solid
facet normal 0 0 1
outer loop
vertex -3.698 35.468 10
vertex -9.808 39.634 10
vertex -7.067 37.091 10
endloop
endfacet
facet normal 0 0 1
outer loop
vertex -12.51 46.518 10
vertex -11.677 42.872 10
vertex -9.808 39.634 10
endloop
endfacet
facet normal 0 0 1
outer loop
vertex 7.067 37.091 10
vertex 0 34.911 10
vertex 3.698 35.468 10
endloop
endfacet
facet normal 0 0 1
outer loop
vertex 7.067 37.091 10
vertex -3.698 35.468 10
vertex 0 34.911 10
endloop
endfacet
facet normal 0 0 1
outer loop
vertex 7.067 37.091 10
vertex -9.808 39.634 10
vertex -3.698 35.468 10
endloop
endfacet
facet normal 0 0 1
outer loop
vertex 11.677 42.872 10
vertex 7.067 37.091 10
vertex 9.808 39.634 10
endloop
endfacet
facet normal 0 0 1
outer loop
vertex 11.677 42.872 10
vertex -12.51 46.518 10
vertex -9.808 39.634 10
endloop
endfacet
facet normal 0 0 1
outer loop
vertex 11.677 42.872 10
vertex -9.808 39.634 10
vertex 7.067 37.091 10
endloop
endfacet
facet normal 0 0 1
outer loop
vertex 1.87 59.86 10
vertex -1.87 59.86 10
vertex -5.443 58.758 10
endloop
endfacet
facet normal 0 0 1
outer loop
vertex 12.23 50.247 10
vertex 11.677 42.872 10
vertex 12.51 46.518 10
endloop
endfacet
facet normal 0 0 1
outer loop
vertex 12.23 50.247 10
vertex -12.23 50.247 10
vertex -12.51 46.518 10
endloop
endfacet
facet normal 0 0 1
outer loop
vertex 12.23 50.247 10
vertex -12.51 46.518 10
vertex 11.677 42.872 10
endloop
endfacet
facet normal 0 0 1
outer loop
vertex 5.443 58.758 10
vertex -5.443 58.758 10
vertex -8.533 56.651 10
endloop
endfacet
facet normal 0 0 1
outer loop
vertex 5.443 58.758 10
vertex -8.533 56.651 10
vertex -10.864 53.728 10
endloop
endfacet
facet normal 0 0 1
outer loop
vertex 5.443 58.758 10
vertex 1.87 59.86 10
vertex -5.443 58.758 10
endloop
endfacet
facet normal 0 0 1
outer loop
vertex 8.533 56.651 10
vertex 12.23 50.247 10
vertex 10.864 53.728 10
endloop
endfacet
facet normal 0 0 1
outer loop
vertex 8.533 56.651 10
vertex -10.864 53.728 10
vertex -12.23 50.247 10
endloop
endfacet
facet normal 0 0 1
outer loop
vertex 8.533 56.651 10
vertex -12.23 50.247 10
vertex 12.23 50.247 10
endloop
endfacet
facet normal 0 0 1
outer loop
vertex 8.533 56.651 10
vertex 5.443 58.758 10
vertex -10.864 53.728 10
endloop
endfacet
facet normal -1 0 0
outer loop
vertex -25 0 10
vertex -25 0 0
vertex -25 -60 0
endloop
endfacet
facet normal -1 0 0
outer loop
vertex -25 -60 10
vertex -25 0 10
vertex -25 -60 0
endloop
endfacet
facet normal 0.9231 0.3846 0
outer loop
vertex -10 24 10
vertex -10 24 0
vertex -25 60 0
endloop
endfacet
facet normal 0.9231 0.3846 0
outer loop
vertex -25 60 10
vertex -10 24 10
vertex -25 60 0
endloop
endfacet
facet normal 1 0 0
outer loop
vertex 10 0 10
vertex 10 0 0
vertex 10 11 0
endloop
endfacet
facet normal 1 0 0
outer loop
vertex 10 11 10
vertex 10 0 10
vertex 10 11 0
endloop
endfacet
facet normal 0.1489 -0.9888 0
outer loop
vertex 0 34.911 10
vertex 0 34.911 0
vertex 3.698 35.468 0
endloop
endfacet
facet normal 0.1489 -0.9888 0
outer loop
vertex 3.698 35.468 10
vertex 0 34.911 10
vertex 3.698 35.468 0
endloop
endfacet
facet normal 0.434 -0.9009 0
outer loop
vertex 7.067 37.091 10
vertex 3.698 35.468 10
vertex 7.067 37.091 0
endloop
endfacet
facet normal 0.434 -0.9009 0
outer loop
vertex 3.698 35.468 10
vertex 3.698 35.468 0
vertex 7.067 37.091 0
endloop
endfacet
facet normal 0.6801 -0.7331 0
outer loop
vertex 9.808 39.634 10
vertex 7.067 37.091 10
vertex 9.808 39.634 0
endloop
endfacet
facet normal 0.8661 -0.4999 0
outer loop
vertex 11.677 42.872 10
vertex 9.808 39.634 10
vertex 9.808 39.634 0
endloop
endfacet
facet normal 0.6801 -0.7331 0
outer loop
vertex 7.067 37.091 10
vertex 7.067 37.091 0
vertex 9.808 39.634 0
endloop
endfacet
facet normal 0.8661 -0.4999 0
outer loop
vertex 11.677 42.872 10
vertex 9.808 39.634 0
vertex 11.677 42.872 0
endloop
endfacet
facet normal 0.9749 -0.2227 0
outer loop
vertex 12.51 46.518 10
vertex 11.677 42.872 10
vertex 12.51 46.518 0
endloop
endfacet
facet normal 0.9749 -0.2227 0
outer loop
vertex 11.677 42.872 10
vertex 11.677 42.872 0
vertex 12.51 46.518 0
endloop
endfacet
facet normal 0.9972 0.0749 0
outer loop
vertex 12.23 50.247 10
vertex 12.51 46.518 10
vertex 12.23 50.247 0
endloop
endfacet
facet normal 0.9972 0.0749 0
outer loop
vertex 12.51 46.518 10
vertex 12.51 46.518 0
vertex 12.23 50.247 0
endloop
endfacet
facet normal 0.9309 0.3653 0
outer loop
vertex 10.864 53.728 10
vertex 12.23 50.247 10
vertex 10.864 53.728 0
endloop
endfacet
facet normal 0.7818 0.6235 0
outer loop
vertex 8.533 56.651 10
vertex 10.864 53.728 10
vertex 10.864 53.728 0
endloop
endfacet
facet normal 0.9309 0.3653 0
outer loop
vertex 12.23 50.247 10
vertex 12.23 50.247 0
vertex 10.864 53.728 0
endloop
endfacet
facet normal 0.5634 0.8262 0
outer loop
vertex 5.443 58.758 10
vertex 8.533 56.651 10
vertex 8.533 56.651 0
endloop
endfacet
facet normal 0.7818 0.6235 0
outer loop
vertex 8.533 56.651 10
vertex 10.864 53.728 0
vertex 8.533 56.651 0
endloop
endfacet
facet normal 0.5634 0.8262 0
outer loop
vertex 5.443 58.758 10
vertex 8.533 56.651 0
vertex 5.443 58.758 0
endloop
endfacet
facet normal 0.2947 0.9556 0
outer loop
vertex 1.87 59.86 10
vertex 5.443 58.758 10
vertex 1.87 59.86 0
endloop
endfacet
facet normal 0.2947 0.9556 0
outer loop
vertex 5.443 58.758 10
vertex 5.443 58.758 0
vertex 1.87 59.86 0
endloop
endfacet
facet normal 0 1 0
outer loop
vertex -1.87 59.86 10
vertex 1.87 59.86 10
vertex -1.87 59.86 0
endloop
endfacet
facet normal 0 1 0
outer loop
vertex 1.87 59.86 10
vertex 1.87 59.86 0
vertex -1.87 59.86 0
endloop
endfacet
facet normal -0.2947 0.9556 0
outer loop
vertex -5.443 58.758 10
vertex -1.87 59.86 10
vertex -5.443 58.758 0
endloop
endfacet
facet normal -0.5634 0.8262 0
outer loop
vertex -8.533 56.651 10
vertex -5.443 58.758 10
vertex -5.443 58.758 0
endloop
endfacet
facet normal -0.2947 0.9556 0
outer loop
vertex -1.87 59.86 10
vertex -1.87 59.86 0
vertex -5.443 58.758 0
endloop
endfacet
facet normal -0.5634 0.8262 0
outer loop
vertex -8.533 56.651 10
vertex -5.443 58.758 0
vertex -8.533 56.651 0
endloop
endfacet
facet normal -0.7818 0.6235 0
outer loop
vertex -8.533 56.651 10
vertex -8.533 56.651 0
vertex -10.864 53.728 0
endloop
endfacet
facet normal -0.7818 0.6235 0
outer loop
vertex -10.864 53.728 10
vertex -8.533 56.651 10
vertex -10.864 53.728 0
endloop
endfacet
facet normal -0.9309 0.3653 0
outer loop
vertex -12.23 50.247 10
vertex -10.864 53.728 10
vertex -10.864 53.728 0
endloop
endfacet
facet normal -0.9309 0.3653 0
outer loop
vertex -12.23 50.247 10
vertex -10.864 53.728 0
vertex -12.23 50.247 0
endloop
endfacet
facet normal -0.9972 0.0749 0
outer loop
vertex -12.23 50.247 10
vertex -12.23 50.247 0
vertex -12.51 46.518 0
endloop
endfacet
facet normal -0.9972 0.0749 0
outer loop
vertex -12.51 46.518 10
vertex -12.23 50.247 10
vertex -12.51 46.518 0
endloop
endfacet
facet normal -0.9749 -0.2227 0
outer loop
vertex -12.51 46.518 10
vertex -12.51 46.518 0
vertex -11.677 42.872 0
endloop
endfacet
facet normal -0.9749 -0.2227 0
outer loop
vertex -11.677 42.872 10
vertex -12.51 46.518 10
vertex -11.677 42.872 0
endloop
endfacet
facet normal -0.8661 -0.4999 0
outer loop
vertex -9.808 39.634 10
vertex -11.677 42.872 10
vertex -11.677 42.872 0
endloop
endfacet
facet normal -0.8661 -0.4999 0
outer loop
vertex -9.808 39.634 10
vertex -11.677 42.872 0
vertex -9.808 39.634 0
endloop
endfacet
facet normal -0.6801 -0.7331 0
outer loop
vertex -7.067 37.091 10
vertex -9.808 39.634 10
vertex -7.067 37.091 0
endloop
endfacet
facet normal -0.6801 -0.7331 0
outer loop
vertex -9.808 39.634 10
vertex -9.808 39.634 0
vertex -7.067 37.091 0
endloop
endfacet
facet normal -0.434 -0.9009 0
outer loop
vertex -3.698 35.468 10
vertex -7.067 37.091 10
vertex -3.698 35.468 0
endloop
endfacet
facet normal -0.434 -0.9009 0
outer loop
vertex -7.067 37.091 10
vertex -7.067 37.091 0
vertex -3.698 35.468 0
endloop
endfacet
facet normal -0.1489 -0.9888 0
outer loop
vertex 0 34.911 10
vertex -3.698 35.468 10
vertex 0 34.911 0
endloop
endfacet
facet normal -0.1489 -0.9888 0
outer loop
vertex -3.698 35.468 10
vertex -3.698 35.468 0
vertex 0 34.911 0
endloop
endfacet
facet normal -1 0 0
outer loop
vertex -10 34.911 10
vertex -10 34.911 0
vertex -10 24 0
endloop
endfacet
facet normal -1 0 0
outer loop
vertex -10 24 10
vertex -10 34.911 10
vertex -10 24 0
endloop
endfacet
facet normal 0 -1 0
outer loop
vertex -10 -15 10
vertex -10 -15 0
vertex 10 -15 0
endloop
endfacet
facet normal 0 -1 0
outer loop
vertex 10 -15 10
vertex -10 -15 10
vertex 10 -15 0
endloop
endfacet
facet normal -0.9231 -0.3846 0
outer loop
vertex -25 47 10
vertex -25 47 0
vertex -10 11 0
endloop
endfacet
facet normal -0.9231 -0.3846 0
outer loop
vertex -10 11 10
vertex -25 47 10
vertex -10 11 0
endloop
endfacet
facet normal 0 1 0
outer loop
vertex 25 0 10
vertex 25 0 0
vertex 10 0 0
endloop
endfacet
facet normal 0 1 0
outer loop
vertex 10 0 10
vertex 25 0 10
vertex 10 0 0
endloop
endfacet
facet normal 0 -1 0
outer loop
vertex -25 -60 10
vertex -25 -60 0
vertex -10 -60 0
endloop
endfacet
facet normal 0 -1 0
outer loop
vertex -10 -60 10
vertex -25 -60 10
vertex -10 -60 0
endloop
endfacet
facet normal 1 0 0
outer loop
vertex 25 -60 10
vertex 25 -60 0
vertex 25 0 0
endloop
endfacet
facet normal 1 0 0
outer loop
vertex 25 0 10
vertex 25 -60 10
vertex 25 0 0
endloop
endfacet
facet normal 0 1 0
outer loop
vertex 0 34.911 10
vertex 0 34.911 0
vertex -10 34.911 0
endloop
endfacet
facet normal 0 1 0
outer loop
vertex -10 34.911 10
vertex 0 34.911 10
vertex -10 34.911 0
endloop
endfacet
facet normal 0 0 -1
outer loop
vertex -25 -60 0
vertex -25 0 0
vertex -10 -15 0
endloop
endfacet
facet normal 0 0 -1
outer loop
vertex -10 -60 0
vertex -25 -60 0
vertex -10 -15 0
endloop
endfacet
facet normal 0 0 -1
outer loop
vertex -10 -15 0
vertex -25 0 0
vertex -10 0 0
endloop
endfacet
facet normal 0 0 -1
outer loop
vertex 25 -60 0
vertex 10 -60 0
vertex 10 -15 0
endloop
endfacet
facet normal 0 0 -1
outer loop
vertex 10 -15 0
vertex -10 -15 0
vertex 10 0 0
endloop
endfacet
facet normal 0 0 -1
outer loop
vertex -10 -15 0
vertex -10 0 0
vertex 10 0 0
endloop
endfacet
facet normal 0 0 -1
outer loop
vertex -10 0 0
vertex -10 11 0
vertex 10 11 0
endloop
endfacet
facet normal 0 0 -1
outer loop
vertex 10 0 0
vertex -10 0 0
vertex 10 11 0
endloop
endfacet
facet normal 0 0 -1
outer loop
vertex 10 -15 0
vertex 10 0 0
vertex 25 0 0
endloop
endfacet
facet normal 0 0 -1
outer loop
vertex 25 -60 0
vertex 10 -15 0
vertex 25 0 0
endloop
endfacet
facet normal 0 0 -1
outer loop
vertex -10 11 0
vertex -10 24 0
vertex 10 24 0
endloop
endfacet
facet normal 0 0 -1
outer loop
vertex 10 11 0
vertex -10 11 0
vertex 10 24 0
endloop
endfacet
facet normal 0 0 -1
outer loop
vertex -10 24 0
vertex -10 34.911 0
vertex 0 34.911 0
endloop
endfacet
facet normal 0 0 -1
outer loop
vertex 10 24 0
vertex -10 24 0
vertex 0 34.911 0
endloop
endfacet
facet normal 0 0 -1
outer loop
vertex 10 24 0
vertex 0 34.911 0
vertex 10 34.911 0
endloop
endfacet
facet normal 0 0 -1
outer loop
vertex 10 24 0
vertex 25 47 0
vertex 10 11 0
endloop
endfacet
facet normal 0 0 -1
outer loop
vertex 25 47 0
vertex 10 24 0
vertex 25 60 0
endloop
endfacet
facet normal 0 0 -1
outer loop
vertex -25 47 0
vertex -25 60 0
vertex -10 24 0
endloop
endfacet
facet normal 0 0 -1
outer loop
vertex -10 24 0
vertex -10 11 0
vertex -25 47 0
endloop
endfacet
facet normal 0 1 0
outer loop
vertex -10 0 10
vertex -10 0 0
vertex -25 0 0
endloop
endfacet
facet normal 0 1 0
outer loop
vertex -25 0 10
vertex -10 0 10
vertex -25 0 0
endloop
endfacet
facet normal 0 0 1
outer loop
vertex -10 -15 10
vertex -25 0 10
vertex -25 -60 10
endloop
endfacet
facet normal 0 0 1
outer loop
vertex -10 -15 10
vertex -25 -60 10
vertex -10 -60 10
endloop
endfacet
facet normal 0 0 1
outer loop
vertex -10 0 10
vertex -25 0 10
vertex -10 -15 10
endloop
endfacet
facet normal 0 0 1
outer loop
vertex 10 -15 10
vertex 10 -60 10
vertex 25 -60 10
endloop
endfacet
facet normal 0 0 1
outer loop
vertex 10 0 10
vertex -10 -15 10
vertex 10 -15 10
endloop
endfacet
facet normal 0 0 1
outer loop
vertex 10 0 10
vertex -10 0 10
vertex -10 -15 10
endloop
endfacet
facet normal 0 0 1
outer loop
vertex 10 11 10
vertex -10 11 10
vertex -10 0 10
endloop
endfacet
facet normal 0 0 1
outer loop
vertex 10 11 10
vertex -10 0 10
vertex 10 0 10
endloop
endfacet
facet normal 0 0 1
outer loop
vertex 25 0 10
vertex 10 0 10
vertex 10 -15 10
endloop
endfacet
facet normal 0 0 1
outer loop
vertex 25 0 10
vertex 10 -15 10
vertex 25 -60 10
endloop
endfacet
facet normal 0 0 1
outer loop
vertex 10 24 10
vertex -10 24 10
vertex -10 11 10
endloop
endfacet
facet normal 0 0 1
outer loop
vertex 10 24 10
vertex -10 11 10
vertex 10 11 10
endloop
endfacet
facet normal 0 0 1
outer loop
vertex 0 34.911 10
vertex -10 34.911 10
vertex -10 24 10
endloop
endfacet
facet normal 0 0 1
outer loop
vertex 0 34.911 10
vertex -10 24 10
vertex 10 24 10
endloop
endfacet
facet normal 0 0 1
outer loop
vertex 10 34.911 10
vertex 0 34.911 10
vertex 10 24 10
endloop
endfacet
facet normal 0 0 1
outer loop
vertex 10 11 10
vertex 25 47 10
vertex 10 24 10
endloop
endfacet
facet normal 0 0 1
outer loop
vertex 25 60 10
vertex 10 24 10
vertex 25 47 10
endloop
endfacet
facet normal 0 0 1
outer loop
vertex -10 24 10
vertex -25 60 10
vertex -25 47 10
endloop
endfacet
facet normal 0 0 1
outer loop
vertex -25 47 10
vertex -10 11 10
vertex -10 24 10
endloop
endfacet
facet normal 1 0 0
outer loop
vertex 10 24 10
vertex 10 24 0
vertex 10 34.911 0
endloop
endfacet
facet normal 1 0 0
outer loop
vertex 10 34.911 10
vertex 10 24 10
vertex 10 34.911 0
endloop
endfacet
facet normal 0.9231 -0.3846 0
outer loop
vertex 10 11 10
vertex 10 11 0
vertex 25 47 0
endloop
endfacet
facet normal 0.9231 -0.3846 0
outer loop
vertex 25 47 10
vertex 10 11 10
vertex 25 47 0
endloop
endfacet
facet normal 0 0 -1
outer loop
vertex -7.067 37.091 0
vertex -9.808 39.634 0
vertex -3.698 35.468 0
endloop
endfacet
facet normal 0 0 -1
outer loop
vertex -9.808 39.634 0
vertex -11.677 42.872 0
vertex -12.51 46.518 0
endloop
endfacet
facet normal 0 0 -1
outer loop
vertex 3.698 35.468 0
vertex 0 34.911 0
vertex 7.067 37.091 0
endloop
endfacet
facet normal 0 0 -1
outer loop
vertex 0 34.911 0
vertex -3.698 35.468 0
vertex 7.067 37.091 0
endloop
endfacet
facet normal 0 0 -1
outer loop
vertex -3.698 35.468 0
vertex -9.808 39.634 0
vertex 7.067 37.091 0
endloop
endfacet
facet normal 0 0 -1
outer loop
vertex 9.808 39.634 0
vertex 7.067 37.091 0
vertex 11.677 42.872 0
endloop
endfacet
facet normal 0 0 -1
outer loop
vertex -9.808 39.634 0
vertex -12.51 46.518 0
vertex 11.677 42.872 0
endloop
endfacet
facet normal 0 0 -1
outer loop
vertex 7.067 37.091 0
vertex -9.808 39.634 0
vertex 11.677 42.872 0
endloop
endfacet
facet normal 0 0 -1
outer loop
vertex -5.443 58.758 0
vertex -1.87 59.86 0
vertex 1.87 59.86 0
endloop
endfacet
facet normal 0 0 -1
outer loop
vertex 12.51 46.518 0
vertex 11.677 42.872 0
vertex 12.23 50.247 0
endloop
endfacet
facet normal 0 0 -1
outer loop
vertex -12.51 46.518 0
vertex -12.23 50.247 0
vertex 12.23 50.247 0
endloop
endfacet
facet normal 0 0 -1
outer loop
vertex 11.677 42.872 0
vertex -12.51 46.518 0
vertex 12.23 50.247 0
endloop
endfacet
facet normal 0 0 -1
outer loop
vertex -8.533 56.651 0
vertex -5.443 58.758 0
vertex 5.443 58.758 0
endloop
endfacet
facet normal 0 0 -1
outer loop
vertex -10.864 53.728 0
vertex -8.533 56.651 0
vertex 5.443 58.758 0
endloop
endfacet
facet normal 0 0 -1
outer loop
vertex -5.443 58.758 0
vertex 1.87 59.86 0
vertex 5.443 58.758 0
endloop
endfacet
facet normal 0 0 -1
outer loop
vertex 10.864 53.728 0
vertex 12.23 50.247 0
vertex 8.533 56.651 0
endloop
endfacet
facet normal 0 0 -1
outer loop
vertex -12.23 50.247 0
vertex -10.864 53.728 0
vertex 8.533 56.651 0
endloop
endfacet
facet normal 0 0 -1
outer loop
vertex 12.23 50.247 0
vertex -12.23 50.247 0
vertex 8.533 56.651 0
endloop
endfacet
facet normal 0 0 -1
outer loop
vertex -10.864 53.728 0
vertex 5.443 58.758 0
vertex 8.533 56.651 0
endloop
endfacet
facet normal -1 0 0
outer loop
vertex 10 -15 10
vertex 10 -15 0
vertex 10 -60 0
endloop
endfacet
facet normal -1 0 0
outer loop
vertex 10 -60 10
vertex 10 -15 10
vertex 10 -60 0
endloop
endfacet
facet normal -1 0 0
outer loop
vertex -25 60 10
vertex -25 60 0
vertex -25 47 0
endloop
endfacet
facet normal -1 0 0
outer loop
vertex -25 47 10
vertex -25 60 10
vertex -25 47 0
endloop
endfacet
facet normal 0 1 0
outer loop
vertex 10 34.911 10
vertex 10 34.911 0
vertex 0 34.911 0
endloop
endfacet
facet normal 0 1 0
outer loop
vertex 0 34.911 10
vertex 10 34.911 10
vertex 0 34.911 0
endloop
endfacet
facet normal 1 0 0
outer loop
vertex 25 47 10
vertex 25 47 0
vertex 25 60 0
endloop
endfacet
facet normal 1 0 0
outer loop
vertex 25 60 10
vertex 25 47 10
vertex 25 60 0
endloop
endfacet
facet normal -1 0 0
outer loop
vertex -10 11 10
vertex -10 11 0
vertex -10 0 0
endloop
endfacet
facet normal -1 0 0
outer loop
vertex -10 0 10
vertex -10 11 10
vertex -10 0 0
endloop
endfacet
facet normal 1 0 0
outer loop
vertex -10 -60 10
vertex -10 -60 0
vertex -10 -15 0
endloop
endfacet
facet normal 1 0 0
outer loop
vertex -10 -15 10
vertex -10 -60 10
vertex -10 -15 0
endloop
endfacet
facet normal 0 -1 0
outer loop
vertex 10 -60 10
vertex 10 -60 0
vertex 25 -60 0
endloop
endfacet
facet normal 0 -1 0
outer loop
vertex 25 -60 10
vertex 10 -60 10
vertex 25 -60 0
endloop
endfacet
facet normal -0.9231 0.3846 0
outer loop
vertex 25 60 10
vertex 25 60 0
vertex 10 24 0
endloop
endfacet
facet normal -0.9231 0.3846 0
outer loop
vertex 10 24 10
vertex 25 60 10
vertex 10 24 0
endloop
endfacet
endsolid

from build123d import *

# Parameters (mm, degrees)
SKETCH_1_R      = 12.544634771
SKETCH_1_W      = 20
SKETCH_1_H      = 15
EXTRUDE_1_DEPTH = 10


with BuildPart() as part:
    # 스케치1 → 보스-돌출1 (new body)
    with BuildSketch(Plane.XY):
        with Locations((0, 47.455365229)):
            Circle(SKETCH_1_R)
        Polygon((-10, 11), (-10, 0), (10, 0), (10, 11), (25, 47), (25, 60), (10, 24), (10, 34.910730459), (0, 34.910730459), (-10, 34.910730459), (-10, 24), (-25, 60), (-25, 47), align=None)
        Polygon((-10, 0), (-25, 0), (-25, -60), (-10, -60), (-10, -34.910730459), (-10, -15), align=None)
        with Locations((0, -7.5)):
            Rectangle(SKETCH_1_W, SKETCH_1_H)
        Polygon((25, 0), (10, 0), (10, -15), (10, -34.910730459), (10, -60), (25, -60), align=None)
    extrude(amount=EXTRUDE_1_DEPTH)


solid = part.part
